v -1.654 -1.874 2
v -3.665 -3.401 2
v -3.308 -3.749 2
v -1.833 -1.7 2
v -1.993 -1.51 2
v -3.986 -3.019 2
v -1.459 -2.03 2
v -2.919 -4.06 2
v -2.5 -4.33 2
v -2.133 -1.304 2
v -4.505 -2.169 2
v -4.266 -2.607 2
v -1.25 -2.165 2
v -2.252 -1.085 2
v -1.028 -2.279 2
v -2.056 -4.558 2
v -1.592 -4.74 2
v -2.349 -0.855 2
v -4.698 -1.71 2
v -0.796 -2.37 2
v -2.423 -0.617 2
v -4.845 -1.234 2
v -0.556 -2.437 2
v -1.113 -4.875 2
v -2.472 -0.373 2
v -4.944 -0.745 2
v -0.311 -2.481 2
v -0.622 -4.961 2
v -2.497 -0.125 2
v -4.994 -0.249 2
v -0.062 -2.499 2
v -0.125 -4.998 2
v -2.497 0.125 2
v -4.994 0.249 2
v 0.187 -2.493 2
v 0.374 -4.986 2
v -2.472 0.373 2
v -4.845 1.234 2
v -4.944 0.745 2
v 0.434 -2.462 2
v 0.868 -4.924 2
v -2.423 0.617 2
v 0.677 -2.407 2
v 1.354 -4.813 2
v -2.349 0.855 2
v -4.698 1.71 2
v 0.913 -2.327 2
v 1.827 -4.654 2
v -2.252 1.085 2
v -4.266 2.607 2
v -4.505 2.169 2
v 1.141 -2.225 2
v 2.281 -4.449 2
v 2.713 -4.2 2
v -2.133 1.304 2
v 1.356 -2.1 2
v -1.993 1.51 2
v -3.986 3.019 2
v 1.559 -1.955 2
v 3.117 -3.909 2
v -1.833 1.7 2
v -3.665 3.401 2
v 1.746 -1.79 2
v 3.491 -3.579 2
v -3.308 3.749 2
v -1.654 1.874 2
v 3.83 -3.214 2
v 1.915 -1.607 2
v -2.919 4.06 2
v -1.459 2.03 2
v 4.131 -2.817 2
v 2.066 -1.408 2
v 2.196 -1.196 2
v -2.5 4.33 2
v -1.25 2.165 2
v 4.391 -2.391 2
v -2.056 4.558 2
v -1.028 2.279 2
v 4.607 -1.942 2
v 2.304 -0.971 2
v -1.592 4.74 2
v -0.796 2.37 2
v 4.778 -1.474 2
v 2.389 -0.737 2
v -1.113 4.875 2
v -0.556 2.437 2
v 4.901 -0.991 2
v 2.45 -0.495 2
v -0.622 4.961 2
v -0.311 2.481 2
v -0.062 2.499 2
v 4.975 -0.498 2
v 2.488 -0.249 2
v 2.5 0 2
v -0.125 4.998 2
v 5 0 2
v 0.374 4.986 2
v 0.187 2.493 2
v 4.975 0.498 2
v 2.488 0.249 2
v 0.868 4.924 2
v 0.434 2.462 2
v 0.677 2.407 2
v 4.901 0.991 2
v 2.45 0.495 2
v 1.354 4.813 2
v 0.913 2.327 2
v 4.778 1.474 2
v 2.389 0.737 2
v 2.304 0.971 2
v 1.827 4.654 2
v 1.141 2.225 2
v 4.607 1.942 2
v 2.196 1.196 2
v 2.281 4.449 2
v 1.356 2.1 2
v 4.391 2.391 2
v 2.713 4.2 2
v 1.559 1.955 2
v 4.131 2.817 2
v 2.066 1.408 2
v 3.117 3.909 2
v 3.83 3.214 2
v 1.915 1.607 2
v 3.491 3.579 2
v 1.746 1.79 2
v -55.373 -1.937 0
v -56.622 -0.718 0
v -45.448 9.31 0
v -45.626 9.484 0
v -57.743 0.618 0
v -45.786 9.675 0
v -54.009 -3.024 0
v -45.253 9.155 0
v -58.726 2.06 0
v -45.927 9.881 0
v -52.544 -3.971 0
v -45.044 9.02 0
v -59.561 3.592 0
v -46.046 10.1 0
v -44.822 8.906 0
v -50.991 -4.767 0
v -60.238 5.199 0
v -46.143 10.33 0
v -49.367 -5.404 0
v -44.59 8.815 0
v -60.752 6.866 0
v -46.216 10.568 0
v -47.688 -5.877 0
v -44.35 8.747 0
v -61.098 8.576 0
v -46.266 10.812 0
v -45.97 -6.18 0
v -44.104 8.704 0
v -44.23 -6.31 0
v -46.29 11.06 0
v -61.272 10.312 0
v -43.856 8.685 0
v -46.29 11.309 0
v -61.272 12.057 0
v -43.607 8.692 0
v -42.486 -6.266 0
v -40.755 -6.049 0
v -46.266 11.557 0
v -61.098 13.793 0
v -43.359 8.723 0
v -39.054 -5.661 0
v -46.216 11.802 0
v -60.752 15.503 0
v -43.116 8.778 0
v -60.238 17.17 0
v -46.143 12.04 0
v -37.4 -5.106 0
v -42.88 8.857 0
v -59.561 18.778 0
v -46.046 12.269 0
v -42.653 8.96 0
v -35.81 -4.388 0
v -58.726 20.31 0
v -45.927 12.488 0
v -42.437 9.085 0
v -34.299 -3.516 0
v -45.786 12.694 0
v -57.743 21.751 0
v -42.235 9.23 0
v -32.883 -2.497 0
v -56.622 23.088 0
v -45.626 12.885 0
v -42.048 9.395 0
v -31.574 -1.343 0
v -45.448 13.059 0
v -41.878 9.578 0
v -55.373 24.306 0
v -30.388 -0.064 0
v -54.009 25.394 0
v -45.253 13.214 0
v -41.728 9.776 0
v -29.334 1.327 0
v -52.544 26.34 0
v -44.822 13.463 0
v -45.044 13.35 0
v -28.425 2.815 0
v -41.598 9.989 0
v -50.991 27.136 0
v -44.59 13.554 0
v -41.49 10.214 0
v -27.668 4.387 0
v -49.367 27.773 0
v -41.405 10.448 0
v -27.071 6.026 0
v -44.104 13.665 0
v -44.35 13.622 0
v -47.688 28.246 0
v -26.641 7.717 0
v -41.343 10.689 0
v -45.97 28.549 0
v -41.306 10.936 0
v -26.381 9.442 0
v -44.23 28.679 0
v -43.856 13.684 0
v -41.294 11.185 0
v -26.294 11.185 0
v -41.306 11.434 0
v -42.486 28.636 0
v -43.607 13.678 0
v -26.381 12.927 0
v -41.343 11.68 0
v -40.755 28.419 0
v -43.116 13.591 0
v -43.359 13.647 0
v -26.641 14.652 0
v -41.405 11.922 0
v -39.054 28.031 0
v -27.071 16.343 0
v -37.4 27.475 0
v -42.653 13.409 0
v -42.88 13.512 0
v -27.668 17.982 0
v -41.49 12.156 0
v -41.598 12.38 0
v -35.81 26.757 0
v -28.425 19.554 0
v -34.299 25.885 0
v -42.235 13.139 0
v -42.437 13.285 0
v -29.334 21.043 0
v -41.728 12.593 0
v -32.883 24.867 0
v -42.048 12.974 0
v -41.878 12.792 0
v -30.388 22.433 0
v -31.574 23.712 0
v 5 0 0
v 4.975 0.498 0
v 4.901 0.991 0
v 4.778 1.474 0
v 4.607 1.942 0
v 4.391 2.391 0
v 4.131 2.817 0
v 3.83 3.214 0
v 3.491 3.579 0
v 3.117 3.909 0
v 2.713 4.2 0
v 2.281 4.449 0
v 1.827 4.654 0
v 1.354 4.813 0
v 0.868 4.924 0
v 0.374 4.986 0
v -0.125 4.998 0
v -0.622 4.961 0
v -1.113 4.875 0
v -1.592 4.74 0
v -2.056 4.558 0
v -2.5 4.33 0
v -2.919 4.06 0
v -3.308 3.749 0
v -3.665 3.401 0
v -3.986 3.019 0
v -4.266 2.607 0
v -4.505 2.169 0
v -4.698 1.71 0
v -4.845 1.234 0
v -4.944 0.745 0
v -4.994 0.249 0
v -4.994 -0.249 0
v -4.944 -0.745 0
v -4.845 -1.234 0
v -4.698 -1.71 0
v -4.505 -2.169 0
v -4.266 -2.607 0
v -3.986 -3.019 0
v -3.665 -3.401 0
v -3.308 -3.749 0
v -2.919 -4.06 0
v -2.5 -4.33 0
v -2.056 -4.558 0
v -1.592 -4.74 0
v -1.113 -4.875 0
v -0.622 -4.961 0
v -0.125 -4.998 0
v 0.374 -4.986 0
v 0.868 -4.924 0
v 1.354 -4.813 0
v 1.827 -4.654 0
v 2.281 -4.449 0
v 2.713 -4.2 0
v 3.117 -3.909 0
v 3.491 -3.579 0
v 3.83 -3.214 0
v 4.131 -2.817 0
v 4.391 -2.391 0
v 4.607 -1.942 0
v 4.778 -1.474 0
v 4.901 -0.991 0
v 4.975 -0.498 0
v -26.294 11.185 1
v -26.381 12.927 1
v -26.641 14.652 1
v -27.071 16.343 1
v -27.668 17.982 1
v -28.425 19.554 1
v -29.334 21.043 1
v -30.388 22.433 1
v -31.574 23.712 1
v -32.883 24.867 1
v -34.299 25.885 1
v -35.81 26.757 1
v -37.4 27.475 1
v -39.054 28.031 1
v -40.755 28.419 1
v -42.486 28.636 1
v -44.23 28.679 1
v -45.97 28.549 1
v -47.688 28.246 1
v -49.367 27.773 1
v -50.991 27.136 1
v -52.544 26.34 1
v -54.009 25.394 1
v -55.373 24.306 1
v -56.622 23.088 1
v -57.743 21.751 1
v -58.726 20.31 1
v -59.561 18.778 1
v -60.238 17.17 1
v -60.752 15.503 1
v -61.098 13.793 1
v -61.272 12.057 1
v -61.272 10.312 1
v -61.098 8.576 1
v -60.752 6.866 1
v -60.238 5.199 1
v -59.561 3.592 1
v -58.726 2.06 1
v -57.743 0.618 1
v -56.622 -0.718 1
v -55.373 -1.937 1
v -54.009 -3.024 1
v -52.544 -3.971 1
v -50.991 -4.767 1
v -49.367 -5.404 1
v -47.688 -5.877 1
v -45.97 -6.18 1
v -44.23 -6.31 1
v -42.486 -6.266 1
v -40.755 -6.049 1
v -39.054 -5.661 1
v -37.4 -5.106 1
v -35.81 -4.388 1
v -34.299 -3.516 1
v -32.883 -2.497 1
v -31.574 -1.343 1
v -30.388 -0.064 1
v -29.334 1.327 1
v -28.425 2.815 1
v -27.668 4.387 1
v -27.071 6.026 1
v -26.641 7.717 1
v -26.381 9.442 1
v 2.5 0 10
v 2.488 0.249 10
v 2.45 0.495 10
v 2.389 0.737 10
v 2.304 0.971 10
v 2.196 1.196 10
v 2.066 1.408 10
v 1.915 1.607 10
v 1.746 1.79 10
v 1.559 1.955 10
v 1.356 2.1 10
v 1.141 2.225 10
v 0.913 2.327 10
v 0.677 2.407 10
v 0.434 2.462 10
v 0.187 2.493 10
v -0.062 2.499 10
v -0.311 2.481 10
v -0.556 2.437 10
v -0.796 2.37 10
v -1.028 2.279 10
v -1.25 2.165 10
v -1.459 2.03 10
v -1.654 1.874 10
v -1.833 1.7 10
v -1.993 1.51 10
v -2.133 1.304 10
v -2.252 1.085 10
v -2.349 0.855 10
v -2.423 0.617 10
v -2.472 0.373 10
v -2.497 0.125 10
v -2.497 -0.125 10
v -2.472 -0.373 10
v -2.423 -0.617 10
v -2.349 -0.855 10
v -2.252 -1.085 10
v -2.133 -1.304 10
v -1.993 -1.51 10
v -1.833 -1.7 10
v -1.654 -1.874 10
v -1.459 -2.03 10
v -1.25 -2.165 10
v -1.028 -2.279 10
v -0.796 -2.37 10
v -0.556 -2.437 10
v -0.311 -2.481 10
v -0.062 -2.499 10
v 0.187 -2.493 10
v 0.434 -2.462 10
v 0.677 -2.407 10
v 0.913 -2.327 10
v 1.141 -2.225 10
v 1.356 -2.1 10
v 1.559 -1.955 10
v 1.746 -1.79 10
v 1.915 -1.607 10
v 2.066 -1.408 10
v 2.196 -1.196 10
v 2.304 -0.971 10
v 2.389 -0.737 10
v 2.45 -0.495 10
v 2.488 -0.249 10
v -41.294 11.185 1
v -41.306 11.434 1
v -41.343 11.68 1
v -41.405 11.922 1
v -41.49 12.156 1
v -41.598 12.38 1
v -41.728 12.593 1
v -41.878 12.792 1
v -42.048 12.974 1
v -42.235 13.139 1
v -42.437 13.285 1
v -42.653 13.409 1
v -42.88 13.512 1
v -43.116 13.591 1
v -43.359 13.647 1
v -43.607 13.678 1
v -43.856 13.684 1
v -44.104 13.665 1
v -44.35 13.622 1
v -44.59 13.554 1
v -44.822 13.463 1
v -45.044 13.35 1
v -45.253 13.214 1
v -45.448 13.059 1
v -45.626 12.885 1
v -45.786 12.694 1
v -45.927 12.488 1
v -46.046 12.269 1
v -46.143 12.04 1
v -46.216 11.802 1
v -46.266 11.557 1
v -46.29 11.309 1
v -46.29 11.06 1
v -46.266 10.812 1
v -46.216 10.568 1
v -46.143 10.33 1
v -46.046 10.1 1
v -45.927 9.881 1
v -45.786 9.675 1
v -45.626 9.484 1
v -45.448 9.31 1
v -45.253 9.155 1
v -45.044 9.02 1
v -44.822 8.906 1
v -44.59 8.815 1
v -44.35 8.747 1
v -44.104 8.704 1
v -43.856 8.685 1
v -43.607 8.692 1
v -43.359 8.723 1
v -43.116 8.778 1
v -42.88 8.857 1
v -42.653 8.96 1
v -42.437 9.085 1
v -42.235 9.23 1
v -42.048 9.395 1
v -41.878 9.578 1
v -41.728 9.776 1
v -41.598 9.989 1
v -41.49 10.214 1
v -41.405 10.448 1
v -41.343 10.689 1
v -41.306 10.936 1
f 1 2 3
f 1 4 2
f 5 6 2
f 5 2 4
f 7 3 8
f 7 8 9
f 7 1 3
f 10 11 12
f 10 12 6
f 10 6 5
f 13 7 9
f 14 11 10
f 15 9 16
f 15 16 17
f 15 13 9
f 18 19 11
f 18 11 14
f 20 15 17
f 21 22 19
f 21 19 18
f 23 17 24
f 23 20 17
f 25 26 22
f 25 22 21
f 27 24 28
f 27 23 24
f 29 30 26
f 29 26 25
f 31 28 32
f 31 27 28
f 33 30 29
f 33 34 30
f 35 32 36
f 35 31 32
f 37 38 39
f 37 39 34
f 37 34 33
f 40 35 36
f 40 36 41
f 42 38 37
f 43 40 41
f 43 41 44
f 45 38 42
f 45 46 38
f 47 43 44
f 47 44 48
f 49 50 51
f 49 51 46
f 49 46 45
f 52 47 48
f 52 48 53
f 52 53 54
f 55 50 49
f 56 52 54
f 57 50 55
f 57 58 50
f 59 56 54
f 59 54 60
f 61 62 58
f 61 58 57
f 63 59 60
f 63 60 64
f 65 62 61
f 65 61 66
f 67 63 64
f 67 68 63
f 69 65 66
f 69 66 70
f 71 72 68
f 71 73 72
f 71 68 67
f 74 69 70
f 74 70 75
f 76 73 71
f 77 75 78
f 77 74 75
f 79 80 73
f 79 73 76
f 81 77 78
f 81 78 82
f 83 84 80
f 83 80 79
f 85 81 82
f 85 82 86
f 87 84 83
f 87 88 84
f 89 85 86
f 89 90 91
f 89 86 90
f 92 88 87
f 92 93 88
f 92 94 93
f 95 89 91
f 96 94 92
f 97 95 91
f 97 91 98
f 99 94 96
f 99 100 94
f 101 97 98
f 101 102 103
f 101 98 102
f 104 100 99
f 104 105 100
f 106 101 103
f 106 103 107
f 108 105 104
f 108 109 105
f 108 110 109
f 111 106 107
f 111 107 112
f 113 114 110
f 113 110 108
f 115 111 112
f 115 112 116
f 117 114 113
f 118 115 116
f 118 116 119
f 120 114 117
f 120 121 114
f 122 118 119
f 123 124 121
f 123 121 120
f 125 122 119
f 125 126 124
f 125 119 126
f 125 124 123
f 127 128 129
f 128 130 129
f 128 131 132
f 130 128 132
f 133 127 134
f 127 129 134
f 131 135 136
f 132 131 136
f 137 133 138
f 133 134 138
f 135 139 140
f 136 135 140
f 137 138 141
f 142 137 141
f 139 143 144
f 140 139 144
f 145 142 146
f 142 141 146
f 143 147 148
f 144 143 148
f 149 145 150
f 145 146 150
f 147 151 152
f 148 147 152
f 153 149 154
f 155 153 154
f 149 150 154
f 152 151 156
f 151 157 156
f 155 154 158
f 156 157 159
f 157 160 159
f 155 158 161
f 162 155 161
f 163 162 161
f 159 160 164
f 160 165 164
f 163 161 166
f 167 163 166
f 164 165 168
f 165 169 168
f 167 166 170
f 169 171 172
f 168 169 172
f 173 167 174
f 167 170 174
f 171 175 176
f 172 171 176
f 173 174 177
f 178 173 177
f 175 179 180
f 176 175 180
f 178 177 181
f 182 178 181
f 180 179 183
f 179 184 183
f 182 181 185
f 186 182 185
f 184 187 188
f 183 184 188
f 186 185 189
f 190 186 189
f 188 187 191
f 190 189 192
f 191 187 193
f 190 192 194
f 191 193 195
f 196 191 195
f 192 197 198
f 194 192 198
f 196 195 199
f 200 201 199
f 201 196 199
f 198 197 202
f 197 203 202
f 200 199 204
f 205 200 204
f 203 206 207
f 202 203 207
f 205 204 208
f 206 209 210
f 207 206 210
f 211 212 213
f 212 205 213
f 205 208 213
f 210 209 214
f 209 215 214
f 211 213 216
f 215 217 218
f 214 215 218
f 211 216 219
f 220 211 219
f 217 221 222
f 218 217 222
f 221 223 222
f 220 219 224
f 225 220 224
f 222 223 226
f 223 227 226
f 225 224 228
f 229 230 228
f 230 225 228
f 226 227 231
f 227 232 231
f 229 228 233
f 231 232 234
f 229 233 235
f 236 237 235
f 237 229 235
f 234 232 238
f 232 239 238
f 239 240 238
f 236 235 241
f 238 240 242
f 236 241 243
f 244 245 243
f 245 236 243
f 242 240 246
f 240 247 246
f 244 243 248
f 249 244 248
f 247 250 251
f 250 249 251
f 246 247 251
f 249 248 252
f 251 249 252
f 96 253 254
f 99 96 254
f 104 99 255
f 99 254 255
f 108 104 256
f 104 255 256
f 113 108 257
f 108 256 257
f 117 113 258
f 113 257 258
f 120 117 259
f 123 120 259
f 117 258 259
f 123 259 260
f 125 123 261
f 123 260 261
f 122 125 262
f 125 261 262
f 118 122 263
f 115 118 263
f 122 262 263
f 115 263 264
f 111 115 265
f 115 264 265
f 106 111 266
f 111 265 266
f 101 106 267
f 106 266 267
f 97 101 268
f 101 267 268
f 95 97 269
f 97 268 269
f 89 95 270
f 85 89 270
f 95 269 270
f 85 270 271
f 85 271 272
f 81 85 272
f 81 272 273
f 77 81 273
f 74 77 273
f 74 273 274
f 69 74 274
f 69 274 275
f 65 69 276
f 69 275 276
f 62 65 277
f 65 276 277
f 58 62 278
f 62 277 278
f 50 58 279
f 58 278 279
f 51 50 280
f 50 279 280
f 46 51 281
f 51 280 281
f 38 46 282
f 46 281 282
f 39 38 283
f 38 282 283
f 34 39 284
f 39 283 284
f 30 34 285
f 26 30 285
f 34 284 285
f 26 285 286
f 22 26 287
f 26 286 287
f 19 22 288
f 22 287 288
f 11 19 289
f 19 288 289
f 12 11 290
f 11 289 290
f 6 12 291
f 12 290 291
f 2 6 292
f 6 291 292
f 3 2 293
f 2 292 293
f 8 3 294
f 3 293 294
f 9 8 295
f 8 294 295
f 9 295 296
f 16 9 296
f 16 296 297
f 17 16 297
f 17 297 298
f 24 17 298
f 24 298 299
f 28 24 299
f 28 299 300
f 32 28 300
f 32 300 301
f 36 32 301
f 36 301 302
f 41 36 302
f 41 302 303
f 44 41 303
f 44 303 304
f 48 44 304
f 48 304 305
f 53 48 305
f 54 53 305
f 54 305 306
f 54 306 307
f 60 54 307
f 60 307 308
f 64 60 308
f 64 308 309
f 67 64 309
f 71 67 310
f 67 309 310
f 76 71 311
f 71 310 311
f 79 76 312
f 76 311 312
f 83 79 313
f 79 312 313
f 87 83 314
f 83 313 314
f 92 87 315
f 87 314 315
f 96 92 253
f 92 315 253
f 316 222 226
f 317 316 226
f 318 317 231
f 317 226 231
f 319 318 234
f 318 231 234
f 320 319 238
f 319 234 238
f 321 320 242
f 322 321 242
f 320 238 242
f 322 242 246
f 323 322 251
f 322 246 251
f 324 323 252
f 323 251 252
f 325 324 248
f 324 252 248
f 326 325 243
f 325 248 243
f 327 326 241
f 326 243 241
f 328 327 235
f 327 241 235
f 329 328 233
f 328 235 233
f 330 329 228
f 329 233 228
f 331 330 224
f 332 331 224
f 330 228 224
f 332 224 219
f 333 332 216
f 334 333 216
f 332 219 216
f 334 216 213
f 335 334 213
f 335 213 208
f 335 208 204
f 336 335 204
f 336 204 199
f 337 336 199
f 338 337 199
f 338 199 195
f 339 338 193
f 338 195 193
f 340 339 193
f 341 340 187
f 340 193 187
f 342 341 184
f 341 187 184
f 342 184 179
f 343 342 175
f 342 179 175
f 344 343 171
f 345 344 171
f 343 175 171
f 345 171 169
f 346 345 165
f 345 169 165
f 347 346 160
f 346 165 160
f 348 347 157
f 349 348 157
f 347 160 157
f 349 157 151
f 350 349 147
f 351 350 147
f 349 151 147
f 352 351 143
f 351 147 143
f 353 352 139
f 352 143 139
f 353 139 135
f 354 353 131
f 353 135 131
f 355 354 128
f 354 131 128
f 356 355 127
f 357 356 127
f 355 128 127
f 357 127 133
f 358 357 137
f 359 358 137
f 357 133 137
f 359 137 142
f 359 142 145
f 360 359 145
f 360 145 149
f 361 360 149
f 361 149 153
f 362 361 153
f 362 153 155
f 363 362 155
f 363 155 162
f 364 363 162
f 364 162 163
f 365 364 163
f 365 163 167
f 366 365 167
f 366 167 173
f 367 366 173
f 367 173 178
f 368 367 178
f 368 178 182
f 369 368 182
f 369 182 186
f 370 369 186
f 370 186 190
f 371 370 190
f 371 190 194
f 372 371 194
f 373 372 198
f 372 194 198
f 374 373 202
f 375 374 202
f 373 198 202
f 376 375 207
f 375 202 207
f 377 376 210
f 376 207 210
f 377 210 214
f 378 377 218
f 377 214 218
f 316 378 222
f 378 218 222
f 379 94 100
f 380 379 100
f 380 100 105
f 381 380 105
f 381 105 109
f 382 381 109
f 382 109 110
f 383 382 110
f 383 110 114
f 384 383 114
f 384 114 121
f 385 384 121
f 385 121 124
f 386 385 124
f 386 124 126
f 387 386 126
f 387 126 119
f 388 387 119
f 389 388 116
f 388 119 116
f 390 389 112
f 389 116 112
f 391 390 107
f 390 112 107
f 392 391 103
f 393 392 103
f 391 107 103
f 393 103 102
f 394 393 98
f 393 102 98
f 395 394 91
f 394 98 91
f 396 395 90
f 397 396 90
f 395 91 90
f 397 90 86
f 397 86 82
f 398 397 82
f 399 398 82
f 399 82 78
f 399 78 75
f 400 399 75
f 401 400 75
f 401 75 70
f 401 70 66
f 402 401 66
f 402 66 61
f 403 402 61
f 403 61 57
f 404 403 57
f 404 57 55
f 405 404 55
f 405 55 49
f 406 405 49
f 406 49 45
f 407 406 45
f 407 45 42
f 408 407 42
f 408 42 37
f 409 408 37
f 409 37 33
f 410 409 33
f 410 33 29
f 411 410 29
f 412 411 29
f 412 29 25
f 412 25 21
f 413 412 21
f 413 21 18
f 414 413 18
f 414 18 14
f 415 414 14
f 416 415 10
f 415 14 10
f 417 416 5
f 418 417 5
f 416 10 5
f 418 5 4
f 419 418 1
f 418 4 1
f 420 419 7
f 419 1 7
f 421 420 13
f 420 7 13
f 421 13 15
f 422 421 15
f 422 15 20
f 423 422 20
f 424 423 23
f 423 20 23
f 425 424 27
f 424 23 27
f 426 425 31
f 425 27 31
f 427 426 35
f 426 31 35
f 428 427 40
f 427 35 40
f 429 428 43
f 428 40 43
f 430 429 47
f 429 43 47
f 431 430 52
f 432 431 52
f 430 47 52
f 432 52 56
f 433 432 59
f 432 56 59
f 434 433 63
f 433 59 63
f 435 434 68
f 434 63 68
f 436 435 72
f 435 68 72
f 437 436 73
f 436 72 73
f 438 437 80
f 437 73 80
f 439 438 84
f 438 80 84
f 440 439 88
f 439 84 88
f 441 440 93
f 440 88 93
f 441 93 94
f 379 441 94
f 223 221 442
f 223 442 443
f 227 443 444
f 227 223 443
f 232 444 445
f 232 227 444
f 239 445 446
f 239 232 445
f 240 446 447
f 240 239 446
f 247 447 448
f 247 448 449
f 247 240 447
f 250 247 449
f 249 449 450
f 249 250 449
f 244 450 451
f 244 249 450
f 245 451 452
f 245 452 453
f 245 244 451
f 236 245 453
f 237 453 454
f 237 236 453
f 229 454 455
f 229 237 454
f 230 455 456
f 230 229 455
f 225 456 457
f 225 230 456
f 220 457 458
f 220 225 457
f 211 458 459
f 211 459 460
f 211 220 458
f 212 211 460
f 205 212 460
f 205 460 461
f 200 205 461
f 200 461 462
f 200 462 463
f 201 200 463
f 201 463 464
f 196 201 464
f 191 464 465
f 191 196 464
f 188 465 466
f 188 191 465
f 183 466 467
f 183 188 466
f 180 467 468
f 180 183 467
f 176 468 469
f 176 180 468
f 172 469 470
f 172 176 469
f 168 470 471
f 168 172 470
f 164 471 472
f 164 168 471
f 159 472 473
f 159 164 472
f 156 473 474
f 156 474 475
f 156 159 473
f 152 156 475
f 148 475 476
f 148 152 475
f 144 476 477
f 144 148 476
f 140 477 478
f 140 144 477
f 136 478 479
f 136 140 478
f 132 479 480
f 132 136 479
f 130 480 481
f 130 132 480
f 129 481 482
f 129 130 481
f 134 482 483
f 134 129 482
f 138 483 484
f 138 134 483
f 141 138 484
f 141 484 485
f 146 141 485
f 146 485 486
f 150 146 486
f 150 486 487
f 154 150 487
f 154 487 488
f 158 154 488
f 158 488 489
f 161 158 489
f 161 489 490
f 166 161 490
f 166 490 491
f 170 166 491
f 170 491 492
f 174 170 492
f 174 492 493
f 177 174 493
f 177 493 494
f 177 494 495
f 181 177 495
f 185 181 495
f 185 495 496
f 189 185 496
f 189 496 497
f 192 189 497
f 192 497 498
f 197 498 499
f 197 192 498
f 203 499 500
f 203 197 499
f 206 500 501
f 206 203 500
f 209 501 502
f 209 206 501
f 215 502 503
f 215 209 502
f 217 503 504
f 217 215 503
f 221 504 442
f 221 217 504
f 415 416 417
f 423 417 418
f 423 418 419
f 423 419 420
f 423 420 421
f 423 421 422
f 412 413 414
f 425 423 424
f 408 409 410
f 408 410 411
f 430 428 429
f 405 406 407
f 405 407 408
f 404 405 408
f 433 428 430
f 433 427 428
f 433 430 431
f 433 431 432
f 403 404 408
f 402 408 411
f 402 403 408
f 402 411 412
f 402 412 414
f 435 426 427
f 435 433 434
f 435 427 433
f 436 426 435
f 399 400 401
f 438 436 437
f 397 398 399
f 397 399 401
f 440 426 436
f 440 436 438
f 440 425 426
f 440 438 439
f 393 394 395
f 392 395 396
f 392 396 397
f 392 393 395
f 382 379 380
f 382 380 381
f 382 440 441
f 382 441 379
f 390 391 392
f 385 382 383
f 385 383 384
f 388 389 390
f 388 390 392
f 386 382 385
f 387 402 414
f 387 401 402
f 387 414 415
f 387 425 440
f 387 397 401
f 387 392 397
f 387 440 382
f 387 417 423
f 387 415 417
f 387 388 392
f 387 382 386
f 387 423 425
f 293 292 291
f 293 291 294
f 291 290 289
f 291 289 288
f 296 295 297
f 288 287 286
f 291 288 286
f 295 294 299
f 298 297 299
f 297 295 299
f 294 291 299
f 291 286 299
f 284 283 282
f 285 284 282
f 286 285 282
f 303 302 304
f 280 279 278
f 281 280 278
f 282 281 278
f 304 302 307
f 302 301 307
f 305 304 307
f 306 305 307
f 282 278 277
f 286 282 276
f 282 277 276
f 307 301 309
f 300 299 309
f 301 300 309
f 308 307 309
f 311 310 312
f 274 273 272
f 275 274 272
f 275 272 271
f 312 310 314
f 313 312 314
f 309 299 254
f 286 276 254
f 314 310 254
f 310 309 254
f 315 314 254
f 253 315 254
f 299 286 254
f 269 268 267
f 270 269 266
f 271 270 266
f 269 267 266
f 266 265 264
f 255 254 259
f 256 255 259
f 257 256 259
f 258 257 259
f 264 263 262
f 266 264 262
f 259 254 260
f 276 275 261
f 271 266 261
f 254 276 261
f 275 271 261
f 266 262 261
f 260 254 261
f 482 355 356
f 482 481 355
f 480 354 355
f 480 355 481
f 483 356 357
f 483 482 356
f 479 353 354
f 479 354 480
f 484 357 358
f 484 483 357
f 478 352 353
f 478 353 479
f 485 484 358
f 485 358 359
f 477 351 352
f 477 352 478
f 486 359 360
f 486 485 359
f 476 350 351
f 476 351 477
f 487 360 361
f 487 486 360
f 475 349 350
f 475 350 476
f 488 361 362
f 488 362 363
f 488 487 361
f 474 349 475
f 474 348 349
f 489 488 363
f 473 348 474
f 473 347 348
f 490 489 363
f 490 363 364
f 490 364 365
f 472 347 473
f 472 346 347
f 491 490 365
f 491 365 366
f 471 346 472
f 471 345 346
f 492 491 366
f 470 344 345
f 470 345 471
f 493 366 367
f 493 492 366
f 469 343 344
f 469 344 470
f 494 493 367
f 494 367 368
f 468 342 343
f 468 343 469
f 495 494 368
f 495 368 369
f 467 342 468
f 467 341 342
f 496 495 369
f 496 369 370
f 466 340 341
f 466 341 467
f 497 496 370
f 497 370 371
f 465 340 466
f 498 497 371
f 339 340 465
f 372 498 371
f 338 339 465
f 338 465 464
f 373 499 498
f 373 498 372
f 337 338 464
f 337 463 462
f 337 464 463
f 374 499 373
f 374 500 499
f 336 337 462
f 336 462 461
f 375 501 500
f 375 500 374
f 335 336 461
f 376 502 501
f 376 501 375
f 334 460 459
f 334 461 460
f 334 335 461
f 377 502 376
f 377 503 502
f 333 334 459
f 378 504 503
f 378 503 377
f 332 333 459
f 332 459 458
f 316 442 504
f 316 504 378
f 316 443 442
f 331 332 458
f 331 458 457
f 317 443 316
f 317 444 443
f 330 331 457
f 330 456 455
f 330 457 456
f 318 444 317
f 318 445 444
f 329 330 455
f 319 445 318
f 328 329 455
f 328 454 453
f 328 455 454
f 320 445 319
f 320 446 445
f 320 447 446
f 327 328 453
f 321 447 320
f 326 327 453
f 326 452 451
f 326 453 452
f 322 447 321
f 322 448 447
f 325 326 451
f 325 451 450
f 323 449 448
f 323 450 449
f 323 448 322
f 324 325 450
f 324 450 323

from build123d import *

# Parameters (mm, degrees)
F0_R     = 5
F0_R_2   = 2.5
F1_DEPTH = 2
F2_R     = 17.5
F2_R_2   = 2.5
F3_DEPTH = 1
F4_R     = 2.5
F5_DEPTH = 10


with BuildPart() as f1:
    # F0 (on Top) → F1 (new body)
    with BuildSketch(Plane.XY):
        Circle(F0_R)
        Circle(F0_R_2, mode=Mode.SUBTRACT)
    extrude(amount=F1_DEPTH)

    # F4 (on Top) → F5 (join)
    with BuildSketch(Plane.XY):
        Circle(F4_R)
    extrude(amount=F5_DEPTH)


with BuildPart() as f3:
    # F2 (on Top) → F3 (new body)
    with BuildSketch(Plane.XY):
        with Locations((-43.793578, 11.184639)):
            Circle(F2_R)
        with Locations((-43.793578, 11.184639)):
            Circle(F2_R_2, mode=Mode.SUBTRACT)
    extrude(amount=F3_DEPTH)


solid = Compound([f1.part, f3.part])
